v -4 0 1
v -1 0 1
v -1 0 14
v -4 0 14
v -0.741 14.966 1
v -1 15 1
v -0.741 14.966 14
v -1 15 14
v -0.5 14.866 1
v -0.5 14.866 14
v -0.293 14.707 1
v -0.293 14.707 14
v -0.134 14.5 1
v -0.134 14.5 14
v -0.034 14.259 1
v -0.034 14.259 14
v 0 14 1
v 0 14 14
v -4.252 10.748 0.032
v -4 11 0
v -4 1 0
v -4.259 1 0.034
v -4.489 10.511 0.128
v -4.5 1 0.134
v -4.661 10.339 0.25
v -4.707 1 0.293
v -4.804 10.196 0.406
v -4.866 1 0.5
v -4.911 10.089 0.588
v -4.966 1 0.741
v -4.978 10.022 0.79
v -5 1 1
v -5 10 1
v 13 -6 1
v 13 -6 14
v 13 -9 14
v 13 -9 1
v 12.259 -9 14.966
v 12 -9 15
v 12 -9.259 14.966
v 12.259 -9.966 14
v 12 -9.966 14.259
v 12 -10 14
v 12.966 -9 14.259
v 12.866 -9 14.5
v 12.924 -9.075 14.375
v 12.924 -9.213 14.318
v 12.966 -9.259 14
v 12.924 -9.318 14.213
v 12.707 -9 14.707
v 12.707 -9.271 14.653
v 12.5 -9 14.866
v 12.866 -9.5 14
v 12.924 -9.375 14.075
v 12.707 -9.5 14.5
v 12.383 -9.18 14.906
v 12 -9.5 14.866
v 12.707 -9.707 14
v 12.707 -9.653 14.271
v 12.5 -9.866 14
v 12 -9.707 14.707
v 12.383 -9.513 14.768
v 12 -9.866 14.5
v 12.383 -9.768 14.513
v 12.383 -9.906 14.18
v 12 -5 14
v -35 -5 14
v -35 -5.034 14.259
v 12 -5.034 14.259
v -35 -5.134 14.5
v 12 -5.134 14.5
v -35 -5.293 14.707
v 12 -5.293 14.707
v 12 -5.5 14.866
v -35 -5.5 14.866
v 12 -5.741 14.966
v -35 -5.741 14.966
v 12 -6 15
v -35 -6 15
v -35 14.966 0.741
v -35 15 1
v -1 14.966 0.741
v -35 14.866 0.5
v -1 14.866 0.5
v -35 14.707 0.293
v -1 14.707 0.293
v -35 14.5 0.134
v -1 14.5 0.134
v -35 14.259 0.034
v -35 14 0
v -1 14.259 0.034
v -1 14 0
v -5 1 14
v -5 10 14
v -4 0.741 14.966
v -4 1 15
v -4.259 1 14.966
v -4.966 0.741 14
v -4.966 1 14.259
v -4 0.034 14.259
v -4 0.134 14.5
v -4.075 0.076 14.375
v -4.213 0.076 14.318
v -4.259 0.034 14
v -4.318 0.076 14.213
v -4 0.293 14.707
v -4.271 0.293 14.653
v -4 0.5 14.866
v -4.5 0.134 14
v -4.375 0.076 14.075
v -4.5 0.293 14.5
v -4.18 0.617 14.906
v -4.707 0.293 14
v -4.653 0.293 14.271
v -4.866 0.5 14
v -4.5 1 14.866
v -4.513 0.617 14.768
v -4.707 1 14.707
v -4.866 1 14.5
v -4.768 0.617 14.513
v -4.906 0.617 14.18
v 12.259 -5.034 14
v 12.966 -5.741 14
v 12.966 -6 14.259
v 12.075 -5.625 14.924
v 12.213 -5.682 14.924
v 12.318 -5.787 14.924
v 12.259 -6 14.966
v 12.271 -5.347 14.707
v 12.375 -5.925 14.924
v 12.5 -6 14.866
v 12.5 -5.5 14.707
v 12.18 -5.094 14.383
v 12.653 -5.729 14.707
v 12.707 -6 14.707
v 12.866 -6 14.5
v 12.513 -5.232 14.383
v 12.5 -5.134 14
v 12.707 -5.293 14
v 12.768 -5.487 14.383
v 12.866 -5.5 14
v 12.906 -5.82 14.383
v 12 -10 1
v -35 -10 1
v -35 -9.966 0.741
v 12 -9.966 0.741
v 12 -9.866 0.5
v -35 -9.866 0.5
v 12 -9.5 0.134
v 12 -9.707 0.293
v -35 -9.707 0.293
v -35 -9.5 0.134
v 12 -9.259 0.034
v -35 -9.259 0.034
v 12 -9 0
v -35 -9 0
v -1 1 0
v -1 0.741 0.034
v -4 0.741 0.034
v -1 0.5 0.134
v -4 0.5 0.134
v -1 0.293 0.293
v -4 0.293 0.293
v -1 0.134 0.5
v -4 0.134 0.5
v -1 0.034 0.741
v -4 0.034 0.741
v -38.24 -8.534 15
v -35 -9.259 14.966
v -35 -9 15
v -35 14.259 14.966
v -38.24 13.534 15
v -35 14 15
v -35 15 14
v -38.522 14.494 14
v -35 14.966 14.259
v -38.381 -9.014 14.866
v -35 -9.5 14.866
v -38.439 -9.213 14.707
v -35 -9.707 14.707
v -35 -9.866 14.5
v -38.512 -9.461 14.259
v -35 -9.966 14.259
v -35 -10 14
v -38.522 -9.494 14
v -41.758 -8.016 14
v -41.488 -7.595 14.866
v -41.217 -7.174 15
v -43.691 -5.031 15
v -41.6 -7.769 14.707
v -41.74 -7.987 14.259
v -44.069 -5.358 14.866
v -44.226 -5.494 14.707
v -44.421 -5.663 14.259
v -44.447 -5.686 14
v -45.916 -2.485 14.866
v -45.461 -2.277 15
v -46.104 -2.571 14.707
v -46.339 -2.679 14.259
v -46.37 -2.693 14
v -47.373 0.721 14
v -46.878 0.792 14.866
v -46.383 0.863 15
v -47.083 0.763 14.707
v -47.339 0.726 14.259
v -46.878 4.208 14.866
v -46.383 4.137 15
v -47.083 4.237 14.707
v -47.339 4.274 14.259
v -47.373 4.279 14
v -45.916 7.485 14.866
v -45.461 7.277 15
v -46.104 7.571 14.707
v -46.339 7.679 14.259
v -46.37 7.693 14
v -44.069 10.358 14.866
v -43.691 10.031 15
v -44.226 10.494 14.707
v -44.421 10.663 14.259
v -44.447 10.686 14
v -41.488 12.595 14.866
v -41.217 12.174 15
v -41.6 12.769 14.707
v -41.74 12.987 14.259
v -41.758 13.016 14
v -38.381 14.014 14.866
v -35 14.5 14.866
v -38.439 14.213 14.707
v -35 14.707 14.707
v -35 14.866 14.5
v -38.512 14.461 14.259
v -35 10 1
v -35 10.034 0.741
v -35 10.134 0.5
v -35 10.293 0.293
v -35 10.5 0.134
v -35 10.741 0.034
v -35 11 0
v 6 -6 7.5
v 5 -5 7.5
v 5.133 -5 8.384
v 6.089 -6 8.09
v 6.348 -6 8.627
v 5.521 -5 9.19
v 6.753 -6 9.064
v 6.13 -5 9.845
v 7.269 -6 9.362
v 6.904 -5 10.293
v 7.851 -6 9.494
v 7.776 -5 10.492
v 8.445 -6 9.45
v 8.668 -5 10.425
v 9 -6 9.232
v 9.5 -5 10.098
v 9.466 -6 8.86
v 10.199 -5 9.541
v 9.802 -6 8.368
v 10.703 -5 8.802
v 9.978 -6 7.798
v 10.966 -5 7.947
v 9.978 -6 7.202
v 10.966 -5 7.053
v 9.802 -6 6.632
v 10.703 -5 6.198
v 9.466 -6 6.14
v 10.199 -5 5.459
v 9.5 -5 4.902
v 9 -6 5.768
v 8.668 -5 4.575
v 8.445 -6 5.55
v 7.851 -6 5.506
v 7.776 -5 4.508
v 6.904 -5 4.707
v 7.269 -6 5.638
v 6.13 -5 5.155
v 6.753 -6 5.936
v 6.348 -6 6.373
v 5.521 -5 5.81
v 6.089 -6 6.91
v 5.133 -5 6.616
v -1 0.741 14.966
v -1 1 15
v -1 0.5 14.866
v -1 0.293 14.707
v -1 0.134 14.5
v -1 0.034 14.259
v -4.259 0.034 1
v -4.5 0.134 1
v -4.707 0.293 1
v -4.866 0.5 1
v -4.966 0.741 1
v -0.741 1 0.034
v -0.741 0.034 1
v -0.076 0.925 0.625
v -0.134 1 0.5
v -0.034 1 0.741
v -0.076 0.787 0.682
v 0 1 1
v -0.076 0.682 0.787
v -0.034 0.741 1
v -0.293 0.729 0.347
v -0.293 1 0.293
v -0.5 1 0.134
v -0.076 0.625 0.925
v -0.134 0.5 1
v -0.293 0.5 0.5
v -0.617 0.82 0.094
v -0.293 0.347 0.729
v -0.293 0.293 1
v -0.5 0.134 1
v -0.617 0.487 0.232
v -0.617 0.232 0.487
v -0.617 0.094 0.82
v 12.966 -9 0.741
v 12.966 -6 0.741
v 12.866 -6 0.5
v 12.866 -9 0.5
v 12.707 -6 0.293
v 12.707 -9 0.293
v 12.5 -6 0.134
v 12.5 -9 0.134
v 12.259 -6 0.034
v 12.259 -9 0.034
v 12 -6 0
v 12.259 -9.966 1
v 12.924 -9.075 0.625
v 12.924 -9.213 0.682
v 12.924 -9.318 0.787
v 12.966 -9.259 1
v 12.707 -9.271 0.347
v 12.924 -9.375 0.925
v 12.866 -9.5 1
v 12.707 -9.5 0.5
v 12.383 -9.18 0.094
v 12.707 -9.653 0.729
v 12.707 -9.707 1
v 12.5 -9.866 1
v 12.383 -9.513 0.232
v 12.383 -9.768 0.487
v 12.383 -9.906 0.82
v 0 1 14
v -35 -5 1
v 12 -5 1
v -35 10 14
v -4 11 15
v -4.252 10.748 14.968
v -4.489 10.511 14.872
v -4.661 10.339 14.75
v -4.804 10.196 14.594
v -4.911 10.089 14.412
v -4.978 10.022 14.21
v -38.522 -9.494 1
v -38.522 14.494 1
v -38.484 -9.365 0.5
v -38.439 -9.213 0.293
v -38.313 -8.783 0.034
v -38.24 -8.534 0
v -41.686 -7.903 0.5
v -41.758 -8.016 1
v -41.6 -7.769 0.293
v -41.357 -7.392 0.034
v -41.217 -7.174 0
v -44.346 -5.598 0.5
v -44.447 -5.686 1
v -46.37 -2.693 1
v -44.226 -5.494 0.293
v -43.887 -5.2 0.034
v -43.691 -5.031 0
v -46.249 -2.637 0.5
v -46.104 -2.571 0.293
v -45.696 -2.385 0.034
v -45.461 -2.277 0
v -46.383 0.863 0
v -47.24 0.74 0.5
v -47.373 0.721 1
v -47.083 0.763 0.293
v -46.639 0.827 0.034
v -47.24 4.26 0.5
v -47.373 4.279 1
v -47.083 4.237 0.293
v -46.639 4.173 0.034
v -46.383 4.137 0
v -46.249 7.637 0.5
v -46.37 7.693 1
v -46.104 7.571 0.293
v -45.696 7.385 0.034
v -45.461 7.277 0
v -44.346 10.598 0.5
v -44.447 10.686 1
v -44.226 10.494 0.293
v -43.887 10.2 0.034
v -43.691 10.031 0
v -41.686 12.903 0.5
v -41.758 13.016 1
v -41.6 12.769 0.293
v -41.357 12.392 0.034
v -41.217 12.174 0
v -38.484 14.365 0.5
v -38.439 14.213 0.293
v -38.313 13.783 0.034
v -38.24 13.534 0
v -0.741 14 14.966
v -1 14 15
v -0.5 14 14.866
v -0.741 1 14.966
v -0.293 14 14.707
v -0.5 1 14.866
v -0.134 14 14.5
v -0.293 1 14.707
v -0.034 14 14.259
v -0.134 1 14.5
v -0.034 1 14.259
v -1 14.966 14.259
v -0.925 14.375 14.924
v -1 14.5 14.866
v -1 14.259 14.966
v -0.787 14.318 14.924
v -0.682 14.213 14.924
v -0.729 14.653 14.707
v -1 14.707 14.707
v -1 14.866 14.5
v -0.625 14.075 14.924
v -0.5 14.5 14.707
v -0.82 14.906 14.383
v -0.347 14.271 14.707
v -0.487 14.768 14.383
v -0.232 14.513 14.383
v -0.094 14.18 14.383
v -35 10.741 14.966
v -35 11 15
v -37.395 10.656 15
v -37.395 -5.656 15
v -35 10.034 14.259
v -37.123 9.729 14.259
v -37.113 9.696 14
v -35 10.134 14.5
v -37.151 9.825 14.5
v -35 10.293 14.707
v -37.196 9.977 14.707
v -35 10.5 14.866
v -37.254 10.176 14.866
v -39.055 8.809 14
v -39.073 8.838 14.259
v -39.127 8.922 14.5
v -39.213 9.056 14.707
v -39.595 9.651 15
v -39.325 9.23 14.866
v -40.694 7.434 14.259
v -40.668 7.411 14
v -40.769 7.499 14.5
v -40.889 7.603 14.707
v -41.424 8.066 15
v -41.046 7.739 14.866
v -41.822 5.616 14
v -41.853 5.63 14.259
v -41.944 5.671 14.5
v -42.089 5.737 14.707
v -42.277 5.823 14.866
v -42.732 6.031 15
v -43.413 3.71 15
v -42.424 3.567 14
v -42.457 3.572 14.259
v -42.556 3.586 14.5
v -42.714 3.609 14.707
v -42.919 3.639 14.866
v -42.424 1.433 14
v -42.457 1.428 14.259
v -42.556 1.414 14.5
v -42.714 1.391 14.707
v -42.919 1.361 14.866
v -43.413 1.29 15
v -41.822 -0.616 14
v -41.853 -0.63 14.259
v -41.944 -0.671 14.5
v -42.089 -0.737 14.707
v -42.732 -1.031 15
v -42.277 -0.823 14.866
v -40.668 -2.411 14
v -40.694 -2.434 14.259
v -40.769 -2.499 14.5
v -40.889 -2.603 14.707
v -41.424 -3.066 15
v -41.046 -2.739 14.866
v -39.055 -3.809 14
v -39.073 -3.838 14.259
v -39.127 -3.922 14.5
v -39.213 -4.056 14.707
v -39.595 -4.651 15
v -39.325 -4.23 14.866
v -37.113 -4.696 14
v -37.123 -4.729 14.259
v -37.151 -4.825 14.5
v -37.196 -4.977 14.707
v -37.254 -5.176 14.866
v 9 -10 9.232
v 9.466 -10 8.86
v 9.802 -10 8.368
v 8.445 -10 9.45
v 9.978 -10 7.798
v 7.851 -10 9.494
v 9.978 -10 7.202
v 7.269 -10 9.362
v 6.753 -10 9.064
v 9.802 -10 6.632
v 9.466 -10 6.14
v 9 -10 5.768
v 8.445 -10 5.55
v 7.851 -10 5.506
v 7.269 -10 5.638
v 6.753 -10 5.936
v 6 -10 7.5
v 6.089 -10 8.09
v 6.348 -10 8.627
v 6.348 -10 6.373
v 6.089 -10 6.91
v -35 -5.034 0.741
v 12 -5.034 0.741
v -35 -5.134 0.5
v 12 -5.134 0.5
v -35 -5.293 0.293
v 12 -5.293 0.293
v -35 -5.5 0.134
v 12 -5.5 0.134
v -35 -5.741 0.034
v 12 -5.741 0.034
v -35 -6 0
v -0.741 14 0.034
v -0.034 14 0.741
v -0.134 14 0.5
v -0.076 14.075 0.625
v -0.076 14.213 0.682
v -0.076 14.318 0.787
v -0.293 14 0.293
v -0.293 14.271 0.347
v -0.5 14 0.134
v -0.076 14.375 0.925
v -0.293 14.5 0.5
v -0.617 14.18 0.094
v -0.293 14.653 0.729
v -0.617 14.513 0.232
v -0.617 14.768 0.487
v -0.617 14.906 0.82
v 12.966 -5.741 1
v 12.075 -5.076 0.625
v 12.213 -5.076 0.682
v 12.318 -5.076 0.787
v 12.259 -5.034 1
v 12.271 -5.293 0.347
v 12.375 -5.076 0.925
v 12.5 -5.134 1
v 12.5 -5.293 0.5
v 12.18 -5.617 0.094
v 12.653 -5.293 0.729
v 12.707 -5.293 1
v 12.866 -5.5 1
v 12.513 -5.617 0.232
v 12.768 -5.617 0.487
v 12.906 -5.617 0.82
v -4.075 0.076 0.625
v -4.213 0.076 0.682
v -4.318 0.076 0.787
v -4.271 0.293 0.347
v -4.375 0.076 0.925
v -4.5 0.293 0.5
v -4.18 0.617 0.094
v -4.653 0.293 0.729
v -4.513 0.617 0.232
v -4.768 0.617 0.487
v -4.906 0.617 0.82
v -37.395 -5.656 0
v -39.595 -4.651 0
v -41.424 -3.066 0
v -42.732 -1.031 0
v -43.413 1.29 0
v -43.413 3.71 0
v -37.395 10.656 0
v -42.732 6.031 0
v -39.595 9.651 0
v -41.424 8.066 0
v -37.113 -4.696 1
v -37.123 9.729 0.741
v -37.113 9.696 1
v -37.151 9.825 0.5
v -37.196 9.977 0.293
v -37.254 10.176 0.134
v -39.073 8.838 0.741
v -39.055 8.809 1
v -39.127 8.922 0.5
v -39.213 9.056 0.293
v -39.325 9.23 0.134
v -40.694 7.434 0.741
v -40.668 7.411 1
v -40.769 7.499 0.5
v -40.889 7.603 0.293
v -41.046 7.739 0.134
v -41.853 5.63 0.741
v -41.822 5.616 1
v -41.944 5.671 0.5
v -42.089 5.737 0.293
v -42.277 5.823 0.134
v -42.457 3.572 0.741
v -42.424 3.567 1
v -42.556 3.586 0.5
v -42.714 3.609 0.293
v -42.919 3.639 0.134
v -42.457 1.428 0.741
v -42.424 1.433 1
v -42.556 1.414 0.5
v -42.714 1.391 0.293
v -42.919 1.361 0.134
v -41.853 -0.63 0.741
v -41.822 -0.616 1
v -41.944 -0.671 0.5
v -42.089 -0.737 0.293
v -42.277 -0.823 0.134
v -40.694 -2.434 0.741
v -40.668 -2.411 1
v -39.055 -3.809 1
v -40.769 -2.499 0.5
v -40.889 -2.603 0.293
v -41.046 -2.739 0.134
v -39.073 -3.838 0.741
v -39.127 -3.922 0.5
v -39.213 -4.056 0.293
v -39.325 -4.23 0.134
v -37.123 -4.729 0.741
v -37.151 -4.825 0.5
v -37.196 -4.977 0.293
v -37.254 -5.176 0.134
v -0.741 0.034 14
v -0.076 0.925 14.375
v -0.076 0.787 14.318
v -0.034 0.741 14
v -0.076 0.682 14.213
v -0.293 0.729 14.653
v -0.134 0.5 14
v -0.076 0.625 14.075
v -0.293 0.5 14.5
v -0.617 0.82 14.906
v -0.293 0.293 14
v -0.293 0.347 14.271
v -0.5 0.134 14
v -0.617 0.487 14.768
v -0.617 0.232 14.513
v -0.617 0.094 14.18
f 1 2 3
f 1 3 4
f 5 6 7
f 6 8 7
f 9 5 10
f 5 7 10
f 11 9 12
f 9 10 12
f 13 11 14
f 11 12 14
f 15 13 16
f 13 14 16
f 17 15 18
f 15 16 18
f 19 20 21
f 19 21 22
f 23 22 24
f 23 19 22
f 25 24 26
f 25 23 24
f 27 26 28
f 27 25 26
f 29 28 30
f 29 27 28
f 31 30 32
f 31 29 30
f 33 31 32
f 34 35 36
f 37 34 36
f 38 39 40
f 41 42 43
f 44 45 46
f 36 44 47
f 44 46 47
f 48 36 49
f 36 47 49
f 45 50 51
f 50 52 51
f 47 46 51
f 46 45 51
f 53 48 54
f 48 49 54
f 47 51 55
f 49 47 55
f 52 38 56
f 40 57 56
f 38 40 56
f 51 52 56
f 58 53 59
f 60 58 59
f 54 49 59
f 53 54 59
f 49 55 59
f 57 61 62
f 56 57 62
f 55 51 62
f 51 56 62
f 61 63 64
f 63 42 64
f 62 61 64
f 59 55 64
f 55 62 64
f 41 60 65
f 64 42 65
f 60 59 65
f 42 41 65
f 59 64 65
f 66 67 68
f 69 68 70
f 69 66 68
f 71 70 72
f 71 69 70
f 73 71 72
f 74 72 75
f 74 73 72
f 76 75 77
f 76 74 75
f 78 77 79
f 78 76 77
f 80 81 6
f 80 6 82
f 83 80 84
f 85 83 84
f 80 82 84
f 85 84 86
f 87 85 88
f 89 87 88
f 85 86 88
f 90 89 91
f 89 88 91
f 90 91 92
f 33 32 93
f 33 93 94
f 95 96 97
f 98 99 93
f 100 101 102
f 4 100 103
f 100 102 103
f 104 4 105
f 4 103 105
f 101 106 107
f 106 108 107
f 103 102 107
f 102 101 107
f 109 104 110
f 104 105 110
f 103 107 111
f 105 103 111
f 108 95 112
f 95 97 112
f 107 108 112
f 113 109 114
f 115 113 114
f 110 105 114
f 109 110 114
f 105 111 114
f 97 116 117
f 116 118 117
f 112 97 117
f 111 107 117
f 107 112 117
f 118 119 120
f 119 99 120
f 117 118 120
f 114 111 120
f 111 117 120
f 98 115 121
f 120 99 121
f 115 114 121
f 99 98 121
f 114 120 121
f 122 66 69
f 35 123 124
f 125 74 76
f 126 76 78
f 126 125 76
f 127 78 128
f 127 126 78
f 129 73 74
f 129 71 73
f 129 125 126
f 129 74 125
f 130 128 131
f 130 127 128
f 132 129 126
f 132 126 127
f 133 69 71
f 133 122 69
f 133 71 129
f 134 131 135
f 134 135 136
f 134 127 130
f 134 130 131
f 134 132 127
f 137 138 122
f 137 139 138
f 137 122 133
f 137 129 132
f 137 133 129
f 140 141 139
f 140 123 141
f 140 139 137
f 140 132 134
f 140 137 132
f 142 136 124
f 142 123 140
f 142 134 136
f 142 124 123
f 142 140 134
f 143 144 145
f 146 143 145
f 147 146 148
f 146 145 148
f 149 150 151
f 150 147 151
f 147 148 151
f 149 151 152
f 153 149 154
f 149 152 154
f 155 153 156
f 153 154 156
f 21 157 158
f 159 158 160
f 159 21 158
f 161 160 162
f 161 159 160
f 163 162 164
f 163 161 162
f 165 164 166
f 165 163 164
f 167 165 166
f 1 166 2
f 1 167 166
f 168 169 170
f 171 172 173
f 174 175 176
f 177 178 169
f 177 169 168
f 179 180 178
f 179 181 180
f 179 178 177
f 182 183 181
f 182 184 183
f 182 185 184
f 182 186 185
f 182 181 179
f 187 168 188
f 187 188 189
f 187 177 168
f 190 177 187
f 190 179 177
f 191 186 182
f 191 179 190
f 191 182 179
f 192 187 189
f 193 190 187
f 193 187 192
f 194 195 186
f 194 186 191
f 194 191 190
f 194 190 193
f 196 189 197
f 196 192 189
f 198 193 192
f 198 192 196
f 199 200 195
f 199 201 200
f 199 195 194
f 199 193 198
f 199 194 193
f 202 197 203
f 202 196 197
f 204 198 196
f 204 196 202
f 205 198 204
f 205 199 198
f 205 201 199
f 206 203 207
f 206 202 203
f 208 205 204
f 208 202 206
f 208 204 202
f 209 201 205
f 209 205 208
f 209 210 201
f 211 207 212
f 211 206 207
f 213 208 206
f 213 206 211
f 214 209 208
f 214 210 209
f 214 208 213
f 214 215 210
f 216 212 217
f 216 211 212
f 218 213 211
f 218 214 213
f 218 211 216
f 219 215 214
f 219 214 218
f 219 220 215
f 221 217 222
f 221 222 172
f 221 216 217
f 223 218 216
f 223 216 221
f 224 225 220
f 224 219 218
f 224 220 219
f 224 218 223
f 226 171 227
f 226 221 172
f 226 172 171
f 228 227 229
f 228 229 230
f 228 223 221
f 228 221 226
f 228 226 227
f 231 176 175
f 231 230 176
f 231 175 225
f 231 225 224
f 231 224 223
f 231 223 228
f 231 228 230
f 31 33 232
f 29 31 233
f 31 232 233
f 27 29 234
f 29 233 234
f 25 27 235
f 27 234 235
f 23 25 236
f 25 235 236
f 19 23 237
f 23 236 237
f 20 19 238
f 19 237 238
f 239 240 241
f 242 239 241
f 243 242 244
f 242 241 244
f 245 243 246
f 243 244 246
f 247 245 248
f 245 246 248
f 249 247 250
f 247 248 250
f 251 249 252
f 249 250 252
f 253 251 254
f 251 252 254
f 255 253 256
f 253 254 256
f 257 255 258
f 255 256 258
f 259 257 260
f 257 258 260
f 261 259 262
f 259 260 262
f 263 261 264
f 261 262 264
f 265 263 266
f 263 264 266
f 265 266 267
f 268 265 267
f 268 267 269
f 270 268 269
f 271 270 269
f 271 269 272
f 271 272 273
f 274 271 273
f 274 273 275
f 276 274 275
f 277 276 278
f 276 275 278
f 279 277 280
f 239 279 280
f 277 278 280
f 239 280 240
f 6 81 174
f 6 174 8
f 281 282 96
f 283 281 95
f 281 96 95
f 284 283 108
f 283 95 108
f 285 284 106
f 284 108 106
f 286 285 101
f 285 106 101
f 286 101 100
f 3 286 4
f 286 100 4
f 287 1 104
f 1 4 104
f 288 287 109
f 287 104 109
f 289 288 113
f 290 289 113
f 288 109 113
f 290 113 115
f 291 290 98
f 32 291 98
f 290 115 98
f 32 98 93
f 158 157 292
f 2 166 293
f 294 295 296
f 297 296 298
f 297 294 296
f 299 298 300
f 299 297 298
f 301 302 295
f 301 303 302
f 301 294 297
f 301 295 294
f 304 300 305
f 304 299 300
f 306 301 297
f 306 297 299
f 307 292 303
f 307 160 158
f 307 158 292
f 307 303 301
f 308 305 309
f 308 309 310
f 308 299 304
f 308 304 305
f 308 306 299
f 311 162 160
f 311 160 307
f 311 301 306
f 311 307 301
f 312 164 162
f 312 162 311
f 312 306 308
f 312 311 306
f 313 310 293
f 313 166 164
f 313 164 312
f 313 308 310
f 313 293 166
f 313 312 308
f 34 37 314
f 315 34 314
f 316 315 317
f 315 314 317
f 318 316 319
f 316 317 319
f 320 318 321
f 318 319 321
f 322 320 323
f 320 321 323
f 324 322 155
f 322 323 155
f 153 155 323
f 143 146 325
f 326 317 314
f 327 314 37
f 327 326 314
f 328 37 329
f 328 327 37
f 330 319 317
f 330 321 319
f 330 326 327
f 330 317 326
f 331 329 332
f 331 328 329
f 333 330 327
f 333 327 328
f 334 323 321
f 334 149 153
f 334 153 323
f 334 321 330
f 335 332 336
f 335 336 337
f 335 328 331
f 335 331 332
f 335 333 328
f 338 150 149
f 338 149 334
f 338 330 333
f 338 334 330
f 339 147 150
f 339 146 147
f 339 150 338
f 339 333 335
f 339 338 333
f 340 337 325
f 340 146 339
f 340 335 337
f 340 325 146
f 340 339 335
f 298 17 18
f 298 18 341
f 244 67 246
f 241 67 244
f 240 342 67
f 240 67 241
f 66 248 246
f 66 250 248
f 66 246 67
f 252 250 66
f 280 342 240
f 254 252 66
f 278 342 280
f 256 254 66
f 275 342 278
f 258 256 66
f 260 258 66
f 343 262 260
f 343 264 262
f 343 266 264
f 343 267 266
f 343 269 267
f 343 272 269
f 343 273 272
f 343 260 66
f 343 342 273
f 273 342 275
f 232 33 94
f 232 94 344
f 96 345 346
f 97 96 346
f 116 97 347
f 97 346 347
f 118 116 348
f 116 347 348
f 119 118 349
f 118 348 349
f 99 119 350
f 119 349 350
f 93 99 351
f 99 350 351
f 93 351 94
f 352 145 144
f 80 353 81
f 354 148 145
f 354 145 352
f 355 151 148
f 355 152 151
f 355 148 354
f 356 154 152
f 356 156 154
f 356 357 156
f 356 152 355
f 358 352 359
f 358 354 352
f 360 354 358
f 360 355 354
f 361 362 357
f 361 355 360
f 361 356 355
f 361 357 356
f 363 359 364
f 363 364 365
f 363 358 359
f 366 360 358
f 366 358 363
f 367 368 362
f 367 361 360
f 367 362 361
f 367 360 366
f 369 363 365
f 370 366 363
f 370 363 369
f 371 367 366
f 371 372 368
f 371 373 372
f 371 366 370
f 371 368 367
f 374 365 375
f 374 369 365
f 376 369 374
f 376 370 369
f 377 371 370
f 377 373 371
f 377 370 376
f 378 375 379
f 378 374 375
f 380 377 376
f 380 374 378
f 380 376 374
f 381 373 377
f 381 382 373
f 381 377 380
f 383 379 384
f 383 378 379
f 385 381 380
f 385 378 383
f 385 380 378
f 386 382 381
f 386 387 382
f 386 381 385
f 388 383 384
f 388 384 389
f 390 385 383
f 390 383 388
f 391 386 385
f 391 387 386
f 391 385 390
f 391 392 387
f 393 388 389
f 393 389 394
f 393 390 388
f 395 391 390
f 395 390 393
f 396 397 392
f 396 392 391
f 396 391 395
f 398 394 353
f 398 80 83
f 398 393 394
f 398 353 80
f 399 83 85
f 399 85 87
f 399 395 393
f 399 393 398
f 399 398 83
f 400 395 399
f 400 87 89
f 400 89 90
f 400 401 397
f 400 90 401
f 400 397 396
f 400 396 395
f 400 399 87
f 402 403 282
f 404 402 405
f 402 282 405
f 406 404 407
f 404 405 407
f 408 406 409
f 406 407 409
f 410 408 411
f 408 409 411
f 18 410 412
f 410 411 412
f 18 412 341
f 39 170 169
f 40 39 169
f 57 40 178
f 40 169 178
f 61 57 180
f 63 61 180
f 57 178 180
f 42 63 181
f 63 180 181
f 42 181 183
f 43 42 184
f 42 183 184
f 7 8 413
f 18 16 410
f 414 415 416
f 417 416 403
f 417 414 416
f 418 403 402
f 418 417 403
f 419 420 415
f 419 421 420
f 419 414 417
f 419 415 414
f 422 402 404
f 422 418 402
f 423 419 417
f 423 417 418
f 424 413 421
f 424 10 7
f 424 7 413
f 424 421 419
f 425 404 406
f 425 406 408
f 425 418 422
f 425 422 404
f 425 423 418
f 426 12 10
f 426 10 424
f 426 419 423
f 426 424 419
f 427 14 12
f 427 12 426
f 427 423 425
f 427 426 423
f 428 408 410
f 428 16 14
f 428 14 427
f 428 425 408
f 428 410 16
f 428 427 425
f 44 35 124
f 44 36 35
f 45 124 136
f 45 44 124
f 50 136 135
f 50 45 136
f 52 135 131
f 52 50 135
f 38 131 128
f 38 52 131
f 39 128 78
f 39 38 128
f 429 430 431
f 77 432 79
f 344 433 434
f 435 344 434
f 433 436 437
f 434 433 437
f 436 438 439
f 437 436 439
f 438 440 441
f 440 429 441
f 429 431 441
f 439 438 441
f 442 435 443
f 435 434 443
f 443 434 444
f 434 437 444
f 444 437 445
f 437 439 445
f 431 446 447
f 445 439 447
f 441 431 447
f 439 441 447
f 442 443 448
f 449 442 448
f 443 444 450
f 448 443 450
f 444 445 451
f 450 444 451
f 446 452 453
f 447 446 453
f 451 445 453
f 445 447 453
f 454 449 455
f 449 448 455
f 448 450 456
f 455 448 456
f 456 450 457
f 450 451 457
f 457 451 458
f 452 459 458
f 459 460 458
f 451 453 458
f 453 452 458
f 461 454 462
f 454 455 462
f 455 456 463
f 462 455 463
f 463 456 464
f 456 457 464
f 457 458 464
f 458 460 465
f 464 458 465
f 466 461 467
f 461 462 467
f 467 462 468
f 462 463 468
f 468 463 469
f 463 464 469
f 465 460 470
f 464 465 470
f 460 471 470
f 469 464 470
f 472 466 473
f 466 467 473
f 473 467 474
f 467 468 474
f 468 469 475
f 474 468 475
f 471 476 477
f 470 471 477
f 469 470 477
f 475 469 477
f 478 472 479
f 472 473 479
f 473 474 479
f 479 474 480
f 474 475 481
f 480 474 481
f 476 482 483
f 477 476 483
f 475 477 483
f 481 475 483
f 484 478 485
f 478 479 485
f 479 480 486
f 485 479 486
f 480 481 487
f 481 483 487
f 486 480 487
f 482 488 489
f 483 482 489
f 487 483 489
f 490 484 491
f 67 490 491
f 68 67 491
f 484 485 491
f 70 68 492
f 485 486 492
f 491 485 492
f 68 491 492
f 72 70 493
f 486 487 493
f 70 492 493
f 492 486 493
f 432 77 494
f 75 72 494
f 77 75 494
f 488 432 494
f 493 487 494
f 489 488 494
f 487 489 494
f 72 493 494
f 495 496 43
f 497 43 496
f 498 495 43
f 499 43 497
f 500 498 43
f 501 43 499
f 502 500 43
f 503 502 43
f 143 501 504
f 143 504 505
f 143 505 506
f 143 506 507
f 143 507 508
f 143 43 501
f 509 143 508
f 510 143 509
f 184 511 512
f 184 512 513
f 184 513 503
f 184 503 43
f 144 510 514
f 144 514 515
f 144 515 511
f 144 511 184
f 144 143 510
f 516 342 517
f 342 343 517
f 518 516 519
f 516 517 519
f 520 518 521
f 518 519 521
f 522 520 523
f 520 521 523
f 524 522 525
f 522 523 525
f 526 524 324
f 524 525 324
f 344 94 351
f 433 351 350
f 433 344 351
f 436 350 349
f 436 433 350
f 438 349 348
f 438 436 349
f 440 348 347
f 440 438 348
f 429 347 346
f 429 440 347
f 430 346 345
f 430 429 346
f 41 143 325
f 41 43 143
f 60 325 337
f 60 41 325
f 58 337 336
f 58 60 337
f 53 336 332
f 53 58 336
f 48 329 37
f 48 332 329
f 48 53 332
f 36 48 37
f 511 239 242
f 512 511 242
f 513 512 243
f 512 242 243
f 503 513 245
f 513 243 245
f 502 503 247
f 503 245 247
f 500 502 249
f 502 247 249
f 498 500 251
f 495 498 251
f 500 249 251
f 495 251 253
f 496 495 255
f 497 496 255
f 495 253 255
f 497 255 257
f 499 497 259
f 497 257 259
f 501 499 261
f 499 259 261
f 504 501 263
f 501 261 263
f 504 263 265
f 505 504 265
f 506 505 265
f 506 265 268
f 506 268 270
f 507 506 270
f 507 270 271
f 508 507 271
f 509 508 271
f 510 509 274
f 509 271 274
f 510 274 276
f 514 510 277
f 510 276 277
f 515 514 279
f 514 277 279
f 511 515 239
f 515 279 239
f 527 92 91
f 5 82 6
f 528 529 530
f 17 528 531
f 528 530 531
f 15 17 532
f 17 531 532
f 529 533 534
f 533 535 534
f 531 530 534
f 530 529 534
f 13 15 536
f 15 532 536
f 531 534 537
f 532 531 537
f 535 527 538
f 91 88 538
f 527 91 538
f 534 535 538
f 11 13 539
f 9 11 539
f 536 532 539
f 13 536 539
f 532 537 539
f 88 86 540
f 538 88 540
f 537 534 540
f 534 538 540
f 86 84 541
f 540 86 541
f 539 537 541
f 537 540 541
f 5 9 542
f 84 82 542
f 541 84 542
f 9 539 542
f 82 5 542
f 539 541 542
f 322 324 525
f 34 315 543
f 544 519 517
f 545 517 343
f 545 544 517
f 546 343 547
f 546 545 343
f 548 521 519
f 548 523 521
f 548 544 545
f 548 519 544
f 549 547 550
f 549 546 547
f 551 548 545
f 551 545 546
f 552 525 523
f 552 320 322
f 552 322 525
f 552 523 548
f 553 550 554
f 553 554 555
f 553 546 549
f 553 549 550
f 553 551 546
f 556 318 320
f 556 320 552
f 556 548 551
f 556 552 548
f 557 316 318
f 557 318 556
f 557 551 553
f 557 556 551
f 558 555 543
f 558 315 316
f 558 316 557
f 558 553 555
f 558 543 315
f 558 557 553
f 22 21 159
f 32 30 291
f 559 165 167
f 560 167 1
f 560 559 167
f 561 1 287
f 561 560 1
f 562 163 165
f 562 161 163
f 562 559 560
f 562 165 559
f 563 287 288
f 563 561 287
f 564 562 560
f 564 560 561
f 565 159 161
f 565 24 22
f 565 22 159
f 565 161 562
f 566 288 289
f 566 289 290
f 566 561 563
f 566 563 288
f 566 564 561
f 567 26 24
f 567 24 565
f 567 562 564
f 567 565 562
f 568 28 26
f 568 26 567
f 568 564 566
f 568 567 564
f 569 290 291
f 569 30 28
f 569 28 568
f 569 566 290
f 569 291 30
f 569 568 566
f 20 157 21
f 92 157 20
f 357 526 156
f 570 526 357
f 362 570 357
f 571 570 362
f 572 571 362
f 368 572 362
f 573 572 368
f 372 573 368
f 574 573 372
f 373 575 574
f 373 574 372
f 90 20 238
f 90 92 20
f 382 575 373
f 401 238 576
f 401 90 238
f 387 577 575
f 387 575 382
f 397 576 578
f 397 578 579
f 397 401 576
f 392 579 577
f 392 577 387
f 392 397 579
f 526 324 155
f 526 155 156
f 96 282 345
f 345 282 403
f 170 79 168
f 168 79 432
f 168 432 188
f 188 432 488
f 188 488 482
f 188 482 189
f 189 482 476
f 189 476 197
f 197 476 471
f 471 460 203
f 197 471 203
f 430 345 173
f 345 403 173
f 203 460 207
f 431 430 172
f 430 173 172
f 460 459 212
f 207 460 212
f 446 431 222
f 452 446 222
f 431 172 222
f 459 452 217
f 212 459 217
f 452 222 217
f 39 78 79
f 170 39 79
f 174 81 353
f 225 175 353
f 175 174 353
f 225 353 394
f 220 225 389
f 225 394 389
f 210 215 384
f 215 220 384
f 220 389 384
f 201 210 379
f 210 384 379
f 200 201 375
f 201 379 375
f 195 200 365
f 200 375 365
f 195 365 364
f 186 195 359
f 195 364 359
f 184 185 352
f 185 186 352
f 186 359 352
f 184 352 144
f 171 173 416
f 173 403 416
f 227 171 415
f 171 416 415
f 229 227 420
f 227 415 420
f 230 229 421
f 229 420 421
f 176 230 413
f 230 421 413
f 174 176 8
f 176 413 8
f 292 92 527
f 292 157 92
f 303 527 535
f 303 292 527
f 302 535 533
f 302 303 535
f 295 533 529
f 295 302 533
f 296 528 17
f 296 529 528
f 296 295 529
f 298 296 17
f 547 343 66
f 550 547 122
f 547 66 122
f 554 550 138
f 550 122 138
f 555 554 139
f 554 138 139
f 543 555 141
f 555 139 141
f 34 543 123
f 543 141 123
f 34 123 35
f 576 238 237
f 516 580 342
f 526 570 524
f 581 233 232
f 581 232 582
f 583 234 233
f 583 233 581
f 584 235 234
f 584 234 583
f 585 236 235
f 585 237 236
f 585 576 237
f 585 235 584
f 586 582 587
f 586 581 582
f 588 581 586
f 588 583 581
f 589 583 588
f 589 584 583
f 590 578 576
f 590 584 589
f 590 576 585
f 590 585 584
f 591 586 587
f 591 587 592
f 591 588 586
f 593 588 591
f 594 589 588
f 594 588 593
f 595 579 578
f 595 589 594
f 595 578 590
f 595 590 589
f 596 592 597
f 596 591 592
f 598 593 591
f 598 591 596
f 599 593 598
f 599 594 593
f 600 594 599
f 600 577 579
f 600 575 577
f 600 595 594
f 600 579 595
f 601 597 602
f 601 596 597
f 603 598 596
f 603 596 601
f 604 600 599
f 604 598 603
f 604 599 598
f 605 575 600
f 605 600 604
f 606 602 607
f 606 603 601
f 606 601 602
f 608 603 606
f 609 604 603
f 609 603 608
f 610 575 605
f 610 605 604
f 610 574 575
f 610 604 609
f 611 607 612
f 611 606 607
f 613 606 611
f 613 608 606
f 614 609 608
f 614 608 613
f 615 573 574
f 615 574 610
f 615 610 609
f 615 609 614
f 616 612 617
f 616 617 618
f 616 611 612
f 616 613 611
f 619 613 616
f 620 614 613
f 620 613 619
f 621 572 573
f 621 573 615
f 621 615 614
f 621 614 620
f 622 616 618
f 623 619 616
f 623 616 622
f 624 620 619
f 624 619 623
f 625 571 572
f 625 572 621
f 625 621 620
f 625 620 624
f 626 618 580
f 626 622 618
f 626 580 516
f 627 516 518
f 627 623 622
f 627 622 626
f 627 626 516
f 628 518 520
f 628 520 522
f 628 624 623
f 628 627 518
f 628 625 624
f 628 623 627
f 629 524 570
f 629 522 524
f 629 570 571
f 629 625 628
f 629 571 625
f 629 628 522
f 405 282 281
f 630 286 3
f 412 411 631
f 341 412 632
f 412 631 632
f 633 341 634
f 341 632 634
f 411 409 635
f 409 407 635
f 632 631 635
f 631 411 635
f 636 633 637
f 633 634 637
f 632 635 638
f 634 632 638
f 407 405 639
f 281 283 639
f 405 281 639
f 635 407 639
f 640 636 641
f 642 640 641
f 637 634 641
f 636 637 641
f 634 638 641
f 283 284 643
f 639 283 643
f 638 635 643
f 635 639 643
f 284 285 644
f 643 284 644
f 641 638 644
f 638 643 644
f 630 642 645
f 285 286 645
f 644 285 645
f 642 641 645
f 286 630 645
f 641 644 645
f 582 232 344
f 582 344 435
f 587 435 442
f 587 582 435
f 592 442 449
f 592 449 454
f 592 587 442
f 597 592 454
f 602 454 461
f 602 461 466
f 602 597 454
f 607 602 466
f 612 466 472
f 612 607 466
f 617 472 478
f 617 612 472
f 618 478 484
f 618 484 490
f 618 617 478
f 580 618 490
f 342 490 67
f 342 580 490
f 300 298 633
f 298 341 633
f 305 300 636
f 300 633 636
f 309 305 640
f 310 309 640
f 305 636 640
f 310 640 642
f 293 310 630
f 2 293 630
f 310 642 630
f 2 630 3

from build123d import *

# Parameters (mm, degrees)
PAD_DEPTH    = 15
SKETCH001_R  = 2
POCKET_DEPTH = 5
CHAMFER_SIZE = 1
FILLET_R     = 1


with BuildPart() as part:
    # Sketch → Pad (new body)
    with BuildSketch(Plane.XY):
        with BuildLine():
            Line((13, -10), (-35, -10))
            ThreePointArc((-35, 15), (-47.5, 2.5), (-35, -10))
            Line((-35, 15), (0, 15))
            Line((0, 15), (0, 0))
            Line((0, 0), (-5, 0))
            Line((-5, 0), (-5, 10))
            Line((-5, 10), (-35, 10))
            ThreePointArc((-35, 10), (-42.499997, 2.5), (-35, -5))
            Line((-35, -5), (13, -5))
            Line((13, -5), (13, -10))
        make_face()
    extrude(amount=PAD_DEPTH)

    # Sketch001 (on Face9 of Pad) → Pocket (cut)
    with BuildSketch(Plane(origin=(0, -5, 0), x_dir=(-1, 0, 0), z_dir=(0, 1, 0))):
        with Locations((-8, 7.5)):
            Circle(SKETCH001_R)
    extrude(amount=-POCKET_DEPTH, mode=Mode.SUBTRACT)

    # Chamfer
    chamfer_edges = [part.edges().sort_by_distance(p)[0] for p in [
        (10, -5, 7.5),
    ]]
    chamfer(chamfer_edges, length=CHAMFER_SIZE)

    # Fillet
    fillet_edges = [part.edges().sort_by_distance(p)[0] for p in [
        (-11, -10, 0),
        (13, -7.5, 0),
        (-11, -5, 0),
        (-20, 10, 0),
        (-5, 5, 0),
        (-2.5, 0, 0),
        (0, 7.5, 0),
        (13, -5, 7.5),
        (-11, -5, 15),
        (-17.5, 15, 0),
        (0, 15, 7.5),
        (-17.5, 15, 15),
        (-47.5, 2.5, 0),
        (-42.499997, 2.5, 0),
        (-47.5, 2.5, 15),
        (-20, 10, 15),
        (-42.499997, 2.5, 15),
        (-5, 5, 15),
        (-2.5, 0, 15),
        (0, 7.5, 15),
        (13, -7.5, 15),
        (-11, -10, 15),
        (-5, 0, 7.5),
        (0, 0, 7.5),
        (13, -10, 7.5),
    ]]
    fillet(fillet_edges, radius=FILLET_R)


solid = part.part
